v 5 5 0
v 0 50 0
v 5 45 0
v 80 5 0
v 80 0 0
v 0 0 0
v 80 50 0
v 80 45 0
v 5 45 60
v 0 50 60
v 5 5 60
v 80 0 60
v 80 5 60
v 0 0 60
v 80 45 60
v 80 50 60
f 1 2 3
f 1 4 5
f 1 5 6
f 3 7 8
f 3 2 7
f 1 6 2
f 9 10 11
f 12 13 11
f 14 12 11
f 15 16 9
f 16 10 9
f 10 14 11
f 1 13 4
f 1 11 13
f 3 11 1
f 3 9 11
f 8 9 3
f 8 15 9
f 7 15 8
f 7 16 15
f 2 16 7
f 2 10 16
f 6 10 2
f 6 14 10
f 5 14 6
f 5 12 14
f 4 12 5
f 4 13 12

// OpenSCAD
$fn = 32;

// ----------------------------------------------------------------------
// Structural section: channel 80 x 50 mm
// ----------------------------------------------------------------------

// --- parameters (mm) ---
sec_w = 80;               // channel width, X
sec_h = 50;               // channel height, Y
flange_t = 5;             // flange thickness
web_t = 5;                // web thickness
plate_t = 60;             // cut length, Z (extrusion height)
fit_tol = 0.05;           // declared fit tolerance (prompt contract)
free_tol = 0.3;           // declared free tolerance (prompt contract)

profile = [[0, 0], [80, 0], [80, 5], [5, 5], [5, 45], [80, 45], [80, 50], [0, 50]];  // primary outline, 8 points, counter clockwise

// --- the one profile operation ---
linear_extrude(height = plate_t) polygon(points = profile);
